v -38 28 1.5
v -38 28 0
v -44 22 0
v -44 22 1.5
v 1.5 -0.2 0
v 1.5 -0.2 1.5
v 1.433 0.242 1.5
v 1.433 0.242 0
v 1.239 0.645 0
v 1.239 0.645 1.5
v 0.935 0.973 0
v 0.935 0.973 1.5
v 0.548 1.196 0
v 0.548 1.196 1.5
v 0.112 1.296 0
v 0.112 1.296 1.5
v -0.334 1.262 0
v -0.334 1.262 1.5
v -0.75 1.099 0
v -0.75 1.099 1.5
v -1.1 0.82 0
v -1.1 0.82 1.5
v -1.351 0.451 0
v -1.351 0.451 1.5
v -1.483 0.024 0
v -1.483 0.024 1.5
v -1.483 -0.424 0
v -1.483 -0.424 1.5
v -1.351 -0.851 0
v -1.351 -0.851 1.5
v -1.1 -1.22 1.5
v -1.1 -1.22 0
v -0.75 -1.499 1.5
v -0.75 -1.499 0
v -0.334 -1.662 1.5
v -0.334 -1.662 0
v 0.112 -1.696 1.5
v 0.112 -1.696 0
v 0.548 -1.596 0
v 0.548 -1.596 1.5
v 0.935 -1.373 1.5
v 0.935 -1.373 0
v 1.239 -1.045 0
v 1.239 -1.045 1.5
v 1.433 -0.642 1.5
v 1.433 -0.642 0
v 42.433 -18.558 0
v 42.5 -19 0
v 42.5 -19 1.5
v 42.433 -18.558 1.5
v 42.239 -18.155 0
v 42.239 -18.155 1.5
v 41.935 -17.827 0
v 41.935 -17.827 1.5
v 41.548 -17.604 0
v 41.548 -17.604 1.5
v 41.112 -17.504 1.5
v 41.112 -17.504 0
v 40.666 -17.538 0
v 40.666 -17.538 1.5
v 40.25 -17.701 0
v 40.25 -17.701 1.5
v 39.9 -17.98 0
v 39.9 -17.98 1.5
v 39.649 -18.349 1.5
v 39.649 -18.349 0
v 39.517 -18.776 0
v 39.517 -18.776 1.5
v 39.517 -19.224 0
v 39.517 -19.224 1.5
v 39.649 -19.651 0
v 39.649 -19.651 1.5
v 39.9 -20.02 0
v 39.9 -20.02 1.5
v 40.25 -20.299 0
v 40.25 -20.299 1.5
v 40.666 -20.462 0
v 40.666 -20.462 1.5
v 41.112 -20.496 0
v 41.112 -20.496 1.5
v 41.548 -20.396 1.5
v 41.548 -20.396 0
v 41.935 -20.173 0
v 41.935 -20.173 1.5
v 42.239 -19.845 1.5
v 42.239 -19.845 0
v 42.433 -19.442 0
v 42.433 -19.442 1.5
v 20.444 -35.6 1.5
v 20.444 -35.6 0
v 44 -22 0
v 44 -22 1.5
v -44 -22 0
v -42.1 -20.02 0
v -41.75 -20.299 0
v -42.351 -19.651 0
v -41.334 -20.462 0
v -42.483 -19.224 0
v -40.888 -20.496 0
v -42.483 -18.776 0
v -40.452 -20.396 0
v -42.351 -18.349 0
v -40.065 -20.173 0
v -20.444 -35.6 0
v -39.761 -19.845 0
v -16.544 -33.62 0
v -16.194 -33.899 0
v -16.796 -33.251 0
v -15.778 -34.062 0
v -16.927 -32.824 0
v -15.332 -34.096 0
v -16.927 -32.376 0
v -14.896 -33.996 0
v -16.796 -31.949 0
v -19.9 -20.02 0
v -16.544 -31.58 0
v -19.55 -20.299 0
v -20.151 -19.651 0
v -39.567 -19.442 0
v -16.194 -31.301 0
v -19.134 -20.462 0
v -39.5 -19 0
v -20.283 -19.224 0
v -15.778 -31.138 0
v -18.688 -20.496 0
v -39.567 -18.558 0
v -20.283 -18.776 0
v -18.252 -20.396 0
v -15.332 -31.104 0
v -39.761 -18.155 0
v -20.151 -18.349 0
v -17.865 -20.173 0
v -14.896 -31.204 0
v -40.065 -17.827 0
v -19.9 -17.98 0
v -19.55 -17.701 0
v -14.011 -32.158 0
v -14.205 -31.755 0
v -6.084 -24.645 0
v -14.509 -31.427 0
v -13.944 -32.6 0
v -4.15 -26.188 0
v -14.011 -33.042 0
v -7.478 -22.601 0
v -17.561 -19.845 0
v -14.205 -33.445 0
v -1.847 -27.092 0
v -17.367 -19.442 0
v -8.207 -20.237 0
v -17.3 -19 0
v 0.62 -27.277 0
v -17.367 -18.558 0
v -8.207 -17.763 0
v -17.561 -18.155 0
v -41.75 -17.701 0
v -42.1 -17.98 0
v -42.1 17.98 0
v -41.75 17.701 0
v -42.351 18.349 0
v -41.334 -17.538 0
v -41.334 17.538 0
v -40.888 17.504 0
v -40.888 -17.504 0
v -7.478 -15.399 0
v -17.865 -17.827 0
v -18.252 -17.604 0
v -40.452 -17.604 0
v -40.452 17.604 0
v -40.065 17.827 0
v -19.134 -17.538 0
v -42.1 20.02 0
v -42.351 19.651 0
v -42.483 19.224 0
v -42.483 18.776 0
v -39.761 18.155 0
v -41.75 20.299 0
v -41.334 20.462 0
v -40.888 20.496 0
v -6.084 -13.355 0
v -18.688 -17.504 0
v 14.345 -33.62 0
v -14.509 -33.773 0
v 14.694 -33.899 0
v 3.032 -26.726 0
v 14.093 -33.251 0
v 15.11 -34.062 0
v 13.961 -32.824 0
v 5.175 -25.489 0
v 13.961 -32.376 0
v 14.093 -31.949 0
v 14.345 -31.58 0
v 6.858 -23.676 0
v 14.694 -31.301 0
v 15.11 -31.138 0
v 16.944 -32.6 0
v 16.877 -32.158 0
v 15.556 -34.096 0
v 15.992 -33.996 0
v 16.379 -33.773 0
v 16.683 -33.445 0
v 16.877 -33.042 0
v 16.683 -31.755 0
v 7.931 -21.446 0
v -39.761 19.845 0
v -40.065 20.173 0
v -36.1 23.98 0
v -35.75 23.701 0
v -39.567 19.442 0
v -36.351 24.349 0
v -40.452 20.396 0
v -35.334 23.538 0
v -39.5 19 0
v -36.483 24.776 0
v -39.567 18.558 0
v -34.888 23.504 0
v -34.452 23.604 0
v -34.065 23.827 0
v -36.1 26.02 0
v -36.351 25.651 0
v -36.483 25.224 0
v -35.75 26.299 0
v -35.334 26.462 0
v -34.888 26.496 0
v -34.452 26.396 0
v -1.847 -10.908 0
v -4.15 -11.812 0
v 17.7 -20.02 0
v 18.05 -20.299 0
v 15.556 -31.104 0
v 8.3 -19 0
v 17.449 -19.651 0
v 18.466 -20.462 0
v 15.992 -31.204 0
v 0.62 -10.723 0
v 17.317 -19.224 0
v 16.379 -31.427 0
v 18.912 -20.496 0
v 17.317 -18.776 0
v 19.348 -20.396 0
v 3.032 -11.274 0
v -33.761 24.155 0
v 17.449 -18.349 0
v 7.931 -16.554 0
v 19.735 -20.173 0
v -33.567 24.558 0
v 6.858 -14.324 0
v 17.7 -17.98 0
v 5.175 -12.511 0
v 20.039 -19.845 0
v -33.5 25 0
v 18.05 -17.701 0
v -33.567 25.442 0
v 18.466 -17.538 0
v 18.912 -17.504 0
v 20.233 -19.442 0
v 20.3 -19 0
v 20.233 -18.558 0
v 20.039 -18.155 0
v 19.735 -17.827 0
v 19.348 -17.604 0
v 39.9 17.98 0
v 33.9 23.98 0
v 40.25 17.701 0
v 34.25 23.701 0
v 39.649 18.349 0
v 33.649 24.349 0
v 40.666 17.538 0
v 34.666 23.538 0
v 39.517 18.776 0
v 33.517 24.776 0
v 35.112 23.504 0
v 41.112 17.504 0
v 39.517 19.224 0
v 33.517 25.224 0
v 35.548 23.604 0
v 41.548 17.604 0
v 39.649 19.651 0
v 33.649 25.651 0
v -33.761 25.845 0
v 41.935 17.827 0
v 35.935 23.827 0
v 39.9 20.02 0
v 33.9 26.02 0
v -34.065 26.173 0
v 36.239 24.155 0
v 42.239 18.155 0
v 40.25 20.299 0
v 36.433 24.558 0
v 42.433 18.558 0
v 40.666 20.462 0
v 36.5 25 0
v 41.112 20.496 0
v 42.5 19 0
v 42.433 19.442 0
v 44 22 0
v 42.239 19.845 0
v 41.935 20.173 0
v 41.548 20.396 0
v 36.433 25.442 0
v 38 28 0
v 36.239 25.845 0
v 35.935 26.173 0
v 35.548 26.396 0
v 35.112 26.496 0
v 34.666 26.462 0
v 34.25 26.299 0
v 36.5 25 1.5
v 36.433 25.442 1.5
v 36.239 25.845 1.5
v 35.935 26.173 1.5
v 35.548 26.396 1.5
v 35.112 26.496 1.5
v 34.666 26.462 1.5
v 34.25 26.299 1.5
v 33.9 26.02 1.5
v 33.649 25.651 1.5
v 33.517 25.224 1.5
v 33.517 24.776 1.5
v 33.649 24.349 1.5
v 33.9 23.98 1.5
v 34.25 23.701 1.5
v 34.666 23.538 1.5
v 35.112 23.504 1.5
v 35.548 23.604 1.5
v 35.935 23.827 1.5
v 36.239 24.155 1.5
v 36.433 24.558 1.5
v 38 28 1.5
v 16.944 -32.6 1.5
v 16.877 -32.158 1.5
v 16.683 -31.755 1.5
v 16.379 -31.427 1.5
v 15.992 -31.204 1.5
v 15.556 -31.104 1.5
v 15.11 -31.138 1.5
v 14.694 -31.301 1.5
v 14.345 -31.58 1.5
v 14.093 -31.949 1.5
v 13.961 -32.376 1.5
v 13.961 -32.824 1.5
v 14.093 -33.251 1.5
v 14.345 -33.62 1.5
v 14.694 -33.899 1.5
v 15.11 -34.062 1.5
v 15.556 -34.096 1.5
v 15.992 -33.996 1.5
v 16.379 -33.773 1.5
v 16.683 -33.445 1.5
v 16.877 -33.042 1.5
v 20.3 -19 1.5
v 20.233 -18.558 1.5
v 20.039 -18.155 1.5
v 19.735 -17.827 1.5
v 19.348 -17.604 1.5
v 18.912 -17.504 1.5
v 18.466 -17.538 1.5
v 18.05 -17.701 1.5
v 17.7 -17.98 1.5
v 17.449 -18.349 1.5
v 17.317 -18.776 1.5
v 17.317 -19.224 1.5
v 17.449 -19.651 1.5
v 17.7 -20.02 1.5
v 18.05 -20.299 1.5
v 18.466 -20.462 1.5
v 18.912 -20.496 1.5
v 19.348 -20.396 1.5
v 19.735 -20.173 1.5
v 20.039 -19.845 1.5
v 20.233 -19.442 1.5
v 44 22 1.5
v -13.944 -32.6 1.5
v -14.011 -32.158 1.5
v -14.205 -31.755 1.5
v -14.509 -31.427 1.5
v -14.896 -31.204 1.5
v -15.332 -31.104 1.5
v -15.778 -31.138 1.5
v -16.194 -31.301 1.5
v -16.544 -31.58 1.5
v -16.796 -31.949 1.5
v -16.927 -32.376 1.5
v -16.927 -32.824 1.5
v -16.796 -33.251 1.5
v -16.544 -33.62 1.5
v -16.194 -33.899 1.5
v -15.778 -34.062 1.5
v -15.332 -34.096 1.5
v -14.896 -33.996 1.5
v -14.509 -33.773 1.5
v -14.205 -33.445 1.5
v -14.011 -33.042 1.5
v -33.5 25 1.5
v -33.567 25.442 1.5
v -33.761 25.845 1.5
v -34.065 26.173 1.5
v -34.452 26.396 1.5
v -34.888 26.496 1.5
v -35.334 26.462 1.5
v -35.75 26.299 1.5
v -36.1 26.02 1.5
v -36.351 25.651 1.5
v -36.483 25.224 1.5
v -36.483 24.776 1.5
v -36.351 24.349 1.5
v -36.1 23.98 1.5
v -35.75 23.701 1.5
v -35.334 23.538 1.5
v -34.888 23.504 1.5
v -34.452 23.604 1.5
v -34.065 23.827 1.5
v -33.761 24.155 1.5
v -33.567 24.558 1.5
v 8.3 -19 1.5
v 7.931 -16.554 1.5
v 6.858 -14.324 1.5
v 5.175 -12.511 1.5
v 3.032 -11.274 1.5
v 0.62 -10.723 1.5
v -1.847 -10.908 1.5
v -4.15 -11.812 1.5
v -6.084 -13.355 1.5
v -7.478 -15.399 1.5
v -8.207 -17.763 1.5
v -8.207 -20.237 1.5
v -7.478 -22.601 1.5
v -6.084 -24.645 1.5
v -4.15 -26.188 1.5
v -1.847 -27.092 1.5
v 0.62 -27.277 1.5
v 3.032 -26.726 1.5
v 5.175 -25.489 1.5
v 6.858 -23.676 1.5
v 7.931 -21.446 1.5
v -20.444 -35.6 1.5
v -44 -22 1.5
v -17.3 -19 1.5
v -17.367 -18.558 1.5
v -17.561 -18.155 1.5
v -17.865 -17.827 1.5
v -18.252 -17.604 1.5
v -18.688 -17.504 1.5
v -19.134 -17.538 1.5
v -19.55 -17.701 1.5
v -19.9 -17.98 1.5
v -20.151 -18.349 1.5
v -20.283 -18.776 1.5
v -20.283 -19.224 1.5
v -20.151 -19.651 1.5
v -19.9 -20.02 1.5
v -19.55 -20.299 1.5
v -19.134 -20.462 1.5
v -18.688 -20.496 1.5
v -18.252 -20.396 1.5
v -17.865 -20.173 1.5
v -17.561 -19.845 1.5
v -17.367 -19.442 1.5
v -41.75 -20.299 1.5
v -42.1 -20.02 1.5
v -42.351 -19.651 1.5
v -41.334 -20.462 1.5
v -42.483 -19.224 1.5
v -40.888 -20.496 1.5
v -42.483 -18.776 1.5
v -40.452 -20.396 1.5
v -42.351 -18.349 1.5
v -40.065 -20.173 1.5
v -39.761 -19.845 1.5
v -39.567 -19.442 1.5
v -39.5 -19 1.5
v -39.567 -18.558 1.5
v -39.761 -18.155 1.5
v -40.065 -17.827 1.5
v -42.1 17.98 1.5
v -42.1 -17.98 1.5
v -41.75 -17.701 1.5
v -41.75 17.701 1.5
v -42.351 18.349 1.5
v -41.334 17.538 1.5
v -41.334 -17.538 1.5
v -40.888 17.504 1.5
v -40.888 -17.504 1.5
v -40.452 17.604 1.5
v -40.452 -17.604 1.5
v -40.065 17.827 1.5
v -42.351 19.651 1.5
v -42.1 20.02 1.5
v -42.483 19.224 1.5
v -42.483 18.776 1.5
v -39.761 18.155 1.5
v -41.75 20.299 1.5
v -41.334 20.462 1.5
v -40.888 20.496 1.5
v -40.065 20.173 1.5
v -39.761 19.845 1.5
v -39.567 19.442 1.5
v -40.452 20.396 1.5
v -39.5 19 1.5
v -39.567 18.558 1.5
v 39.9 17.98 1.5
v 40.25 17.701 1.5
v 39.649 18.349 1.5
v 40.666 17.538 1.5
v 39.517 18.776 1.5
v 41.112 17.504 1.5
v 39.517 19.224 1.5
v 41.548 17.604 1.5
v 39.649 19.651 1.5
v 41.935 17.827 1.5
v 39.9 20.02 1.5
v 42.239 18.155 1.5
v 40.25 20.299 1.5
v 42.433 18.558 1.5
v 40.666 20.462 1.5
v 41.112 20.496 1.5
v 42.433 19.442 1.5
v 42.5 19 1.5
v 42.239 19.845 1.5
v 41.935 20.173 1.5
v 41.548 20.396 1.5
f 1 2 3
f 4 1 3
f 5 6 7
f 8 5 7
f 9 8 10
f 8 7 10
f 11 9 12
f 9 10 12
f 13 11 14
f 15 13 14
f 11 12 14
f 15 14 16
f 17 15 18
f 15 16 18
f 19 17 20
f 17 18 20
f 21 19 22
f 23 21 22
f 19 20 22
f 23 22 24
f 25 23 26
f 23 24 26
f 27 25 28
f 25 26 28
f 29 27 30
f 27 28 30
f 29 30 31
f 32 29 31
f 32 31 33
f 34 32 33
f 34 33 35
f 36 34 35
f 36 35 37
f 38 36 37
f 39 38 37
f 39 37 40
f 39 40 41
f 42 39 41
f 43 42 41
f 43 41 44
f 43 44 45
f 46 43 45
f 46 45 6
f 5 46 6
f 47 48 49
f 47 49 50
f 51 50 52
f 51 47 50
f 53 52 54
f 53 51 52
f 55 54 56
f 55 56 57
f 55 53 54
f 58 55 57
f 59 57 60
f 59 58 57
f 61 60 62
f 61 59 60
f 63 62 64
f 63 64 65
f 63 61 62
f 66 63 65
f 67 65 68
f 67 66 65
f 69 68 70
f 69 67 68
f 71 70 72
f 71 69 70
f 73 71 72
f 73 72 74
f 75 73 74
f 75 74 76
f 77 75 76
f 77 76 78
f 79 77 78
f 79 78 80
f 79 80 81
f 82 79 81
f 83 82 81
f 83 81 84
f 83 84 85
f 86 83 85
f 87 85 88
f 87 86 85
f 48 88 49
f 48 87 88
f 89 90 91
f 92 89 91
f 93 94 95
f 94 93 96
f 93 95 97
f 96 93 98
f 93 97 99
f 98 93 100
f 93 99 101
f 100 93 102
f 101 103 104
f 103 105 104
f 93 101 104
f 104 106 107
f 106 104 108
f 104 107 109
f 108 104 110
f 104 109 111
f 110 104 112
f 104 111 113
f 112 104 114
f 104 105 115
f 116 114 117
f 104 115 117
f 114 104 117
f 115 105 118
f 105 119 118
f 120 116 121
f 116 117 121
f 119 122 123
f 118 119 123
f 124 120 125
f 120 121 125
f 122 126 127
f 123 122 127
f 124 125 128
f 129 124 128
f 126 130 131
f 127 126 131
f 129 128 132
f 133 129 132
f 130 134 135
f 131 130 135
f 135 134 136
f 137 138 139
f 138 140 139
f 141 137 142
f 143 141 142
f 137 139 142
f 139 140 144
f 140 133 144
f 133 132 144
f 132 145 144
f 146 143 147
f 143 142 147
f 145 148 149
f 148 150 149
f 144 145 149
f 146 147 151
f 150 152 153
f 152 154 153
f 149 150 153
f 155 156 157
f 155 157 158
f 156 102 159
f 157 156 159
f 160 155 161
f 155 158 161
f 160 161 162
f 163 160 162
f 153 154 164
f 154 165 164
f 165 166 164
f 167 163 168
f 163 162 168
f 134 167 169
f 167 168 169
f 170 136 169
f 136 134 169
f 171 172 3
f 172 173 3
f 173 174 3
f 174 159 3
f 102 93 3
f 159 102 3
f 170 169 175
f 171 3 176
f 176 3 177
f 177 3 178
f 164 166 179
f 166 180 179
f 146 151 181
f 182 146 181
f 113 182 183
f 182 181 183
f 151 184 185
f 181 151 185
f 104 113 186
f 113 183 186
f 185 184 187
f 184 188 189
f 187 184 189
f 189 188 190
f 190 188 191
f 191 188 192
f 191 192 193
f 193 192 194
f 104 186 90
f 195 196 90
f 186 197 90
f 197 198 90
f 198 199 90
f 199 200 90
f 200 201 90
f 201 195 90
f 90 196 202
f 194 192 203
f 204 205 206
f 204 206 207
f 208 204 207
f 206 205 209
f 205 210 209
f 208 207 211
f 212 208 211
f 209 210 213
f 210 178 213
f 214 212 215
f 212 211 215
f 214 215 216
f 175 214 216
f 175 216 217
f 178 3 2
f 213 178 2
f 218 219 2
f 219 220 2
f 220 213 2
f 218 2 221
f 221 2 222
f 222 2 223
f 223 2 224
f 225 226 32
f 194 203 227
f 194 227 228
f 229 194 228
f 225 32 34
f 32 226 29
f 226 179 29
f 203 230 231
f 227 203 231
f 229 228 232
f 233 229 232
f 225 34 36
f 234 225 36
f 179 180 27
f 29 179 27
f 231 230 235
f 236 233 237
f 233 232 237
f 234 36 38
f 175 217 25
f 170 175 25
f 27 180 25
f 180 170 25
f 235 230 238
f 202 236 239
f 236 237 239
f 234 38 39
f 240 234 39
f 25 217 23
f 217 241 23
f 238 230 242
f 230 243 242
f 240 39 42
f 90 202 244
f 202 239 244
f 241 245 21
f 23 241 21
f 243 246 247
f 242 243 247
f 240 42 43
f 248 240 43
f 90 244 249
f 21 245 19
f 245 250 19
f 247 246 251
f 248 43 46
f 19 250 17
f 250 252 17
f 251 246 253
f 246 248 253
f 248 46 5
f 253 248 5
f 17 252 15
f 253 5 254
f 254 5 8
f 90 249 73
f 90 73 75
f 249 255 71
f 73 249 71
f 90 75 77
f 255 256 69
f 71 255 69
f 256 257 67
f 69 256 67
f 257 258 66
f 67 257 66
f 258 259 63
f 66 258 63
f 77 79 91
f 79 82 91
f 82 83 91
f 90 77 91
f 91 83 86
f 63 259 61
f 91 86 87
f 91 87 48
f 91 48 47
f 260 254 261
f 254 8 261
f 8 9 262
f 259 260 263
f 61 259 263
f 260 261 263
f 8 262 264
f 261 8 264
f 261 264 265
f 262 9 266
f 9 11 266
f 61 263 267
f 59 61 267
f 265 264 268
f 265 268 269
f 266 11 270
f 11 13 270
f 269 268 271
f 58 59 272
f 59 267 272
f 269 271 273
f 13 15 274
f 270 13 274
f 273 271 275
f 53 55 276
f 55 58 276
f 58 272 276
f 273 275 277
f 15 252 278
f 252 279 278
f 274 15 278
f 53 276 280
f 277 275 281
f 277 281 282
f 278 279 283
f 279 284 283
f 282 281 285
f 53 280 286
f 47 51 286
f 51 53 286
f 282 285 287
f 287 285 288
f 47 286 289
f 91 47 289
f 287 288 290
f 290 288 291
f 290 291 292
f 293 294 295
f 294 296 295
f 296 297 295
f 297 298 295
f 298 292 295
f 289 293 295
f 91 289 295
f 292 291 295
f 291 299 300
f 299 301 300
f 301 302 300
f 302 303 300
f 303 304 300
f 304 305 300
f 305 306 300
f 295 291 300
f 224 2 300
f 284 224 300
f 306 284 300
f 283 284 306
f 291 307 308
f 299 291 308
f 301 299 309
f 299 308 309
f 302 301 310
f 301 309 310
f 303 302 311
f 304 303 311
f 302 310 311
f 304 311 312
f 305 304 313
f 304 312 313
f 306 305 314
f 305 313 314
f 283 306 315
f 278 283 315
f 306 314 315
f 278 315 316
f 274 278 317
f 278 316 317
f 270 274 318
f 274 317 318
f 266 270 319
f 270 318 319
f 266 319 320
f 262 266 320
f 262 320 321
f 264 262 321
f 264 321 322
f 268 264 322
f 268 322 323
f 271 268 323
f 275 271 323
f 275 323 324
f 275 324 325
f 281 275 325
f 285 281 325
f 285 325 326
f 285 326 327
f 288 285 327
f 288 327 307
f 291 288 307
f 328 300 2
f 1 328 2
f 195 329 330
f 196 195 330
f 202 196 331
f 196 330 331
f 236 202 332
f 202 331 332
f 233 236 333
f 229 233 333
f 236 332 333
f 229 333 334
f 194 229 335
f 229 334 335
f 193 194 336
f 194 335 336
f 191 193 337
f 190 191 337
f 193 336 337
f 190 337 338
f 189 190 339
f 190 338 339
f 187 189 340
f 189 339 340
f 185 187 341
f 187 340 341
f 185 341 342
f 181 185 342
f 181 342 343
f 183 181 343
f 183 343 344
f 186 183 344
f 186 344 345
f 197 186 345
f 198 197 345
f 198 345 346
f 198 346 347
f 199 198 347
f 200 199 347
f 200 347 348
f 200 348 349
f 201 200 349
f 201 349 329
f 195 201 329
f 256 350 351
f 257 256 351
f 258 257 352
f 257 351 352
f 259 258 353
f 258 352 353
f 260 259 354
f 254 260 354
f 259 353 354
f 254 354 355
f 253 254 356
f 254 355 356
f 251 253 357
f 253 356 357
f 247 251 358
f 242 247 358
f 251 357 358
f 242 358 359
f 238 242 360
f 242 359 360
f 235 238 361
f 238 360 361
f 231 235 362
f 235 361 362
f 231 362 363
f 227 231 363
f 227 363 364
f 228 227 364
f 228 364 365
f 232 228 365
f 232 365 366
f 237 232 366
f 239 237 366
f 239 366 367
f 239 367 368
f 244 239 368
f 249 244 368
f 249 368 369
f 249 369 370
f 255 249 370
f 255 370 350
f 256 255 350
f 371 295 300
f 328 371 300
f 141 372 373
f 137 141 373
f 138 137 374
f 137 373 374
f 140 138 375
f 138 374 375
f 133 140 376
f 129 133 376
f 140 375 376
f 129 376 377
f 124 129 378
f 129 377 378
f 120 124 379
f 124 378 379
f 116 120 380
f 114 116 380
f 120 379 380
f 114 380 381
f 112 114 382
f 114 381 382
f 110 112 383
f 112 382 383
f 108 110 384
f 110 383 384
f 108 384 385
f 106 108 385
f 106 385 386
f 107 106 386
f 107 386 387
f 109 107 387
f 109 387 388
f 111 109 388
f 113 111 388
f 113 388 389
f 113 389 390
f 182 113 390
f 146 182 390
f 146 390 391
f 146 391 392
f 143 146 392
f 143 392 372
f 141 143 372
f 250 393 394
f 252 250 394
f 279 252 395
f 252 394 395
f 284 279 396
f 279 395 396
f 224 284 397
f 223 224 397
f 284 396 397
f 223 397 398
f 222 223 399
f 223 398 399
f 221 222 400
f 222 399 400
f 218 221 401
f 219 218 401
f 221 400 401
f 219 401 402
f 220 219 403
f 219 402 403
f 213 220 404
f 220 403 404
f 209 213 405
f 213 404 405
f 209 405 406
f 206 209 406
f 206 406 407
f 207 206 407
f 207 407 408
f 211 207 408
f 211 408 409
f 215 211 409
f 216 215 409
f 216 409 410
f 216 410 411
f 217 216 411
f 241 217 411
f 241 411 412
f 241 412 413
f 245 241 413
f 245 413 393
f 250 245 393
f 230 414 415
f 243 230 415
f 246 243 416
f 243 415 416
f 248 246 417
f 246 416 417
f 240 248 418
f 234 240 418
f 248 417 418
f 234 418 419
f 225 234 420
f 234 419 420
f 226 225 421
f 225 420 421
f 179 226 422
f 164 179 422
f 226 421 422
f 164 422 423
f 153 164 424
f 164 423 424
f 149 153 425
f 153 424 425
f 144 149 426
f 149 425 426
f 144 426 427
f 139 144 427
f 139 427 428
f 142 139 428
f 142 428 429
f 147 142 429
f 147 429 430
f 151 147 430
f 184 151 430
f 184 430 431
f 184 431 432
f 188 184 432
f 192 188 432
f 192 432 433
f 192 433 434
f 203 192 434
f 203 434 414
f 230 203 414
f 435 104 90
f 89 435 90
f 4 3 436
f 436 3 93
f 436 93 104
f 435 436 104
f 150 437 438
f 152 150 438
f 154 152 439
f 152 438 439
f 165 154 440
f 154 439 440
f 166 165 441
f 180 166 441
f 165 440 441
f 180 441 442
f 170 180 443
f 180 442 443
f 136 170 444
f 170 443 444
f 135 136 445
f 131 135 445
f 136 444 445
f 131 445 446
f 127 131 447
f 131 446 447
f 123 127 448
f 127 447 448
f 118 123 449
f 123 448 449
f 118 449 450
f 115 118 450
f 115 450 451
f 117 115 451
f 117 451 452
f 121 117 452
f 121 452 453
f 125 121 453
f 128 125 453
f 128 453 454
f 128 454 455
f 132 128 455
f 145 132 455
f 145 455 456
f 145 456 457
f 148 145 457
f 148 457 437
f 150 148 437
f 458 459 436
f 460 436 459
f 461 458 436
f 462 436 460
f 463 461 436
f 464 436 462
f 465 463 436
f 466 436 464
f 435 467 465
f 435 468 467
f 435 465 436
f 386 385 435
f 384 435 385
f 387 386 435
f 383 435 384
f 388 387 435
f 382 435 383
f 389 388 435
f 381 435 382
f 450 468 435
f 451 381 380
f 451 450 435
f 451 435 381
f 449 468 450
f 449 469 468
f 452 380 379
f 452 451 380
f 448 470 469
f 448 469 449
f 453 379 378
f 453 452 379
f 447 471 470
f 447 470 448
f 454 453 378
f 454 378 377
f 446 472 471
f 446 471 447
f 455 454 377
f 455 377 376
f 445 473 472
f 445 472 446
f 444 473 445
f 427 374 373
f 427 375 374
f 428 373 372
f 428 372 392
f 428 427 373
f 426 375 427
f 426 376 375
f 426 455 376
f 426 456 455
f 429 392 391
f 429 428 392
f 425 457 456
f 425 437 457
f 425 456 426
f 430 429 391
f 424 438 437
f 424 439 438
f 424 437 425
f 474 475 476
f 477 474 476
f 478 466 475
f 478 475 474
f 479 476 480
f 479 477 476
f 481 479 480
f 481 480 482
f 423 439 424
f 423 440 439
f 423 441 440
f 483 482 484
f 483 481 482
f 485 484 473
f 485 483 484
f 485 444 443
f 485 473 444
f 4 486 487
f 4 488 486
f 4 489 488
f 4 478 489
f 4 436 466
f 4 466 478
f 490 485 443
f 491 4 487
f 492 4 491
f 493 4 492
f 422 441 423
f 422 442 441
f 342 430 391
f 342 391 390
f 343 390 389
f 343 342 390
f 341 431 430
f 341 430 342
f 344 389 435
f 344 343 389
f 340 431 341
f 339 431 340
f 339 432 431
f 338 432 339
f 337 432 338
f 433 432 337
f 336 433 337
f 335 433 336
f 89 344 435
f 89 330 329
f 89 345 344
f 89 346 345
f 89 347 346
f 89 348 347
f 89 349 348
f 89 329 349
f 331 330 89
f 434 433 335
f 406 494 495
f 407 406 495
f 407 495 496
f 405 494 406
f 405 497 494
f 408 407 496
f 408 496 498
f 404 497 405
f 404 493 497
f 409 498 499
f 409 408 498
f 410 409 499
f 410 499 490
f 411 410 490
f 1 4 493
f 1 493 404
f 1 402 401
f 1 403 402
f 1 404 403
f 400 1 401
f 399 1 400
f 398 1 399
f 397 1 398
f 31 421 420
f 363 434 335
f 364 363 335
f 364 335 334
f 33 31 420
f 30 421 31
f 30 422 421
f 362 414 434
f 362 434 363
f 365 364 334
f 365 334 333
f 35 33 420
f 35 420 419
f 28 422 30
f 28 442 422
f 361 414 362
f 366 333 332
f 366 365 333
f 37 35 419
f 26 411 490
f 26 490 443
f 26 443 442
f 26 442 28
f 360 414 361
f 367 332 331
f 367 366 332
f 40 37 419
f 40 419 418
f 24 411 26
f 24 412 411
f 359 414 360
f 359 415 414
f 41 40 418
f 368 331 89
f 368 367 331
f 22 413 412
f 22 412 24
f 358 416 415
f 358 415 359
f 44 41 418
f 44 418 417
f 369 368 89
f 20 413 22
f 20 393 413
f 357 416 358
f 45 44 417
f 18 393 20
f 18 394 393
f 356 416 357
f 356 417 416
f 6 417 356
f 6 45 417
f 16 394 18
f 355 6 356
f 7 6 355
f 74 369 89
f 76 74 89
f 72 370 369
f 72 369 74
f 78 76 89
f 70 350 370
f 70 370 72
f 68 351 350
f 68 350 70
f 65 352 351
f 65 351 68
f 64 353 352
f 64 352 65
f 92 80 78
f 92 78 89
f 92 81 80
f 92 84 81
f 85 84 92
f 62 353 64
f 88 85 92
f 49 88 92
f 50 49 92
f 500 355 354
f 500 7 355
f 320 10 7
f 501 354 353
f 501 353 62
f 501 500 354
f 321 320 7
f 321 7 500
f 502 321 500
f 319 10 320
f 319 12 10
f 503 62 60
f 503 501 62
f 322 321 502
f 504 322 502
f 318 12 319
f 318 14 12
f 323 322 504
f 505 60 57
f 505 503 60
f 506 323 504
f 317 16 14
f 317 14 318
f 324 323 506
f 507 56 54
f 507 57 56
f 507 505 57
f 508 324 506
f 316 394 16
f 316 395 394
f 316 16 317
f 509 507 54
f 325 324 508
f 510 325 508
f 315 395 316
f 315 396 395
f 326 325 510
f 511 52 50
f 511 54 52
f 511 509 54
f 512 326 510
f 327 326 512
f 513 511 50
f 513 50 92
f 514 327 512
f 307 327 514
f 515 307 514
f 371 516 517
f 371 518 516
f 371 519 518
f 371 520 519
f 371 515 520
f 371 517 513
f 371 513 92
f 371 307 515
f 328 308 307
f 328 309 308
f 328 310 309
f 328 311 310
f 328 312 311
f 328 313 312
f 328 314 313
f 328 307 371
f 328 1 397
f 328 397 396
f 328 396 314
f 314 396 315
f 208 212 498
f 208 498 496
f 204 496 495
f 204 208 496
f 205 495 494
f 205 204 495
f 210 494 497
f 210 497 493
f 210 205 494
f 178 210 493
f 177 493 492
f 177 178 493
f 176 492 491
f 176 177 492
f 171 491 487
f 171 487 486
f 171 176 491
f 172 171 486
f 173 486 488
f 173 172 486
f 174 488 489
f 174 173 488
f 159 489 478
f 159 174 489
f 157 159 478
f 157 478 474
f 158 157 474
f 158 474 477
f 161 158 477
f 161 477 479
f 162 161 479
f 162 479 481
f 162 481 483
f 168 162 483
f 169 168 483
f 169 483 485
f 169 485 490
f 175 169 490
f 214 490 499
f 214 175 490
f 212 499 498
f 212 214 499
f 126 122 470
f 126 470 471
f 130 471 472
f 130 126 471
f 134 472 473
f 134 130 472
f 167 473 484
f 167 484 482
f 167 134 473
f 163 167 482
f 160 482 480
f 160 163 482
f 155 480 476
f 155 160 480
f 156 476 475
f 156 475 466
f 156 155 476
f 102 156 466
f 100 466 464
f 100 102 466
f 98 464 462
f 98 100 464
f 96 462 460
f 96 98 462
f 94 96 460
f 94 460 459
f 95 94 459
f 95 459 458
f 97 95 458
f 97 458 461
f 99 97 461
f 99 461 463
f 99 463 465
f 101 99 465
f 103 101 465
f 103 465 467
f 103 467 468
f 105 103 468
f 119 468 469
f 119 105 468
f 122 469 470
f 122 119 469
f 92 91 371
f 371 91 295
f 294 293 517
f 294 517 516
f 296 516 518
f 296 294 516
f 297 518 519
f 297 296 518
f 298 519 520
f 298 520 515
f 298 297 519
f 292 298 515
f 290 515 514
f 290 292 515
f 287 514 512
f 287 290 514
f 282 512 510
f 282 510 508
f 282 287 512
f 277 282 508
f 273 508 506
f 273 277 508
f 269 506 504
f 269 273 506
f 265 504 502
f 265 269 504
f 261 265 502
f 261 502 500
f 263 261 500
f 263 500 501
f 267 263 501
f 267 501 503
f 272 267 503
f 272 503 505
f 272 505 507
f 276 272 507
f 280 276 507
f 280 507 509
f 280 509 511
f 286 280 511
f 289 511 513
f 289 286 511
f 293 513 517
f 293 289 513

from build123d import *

# Parameters (mm, degrees)
SKETCH_1_R          = 1.5
EXTRUDE_1_DEPTH     = 1.5
SKETCH_2_R          = 1.5
SKETCH_2_R_2        = 8.3
CUT_EXTRUDE_1_DEPTH = 10


with BuildPart() as part:
    # 草图1 → 凸台-拉伸1 (new body)
    with BuildSketch(Plane.XY):
        Polygon((-44, -22), (-20.444109017, -35.6), (20.444109017, -35.6), (44, -22), (44, 22), (38, 28), (-38, 28), (-44, 22), align=None)
        with Locations((-41, 19)):
            Circle(SKETCH_1_R, mode=Mode.SUBTRACT)
        with Locations((-41, -19)):
            Circle(SKETCH_1_R, mode=Mode.SUBTRACT)
        with Locations((41, 19)):
            Circle(SKETCH_1_R, mode=Mode.SUBTRACT)
        with Locations((41, -19)):
            Circle(SKETCH_1_R, mode=Mode.SUBTRACT)
    extrude(amount=EXTRUDE_1_DEPTH)

    # 草图2 → 切除-拉伸1 (cut)
    with BuildSketch(Plane.XY.offset(1.5)):
        with Locations((0, -0.2)):
            Circle(SKETCH_2_R)
        with Locations((-18.8, -19)):
            Circle(SKETCH_2_R)
        with Locations((18.8, -19)):
            Circle(SKETCH_2_R)
        with Locations((0, -19)):
            Circle(SKETCH_2_R_2)
        with Locations((-15.444109017, -32.6)):
            Circle(SKETCH_2_R)
        with Locations((15.444109017, -32.6)):
            Circle(SKETCH_2_R)
        with Locations((-35, 25)):
            Circle(SKETCH_2_R)
        with Locations((35, 25)):
            Circle(SKETCH_2_R)
    extrude(amount=-CUT_EXTRUDE_1_DEPTH, mode=Mode.SUBTRACT)


solid = part.part
